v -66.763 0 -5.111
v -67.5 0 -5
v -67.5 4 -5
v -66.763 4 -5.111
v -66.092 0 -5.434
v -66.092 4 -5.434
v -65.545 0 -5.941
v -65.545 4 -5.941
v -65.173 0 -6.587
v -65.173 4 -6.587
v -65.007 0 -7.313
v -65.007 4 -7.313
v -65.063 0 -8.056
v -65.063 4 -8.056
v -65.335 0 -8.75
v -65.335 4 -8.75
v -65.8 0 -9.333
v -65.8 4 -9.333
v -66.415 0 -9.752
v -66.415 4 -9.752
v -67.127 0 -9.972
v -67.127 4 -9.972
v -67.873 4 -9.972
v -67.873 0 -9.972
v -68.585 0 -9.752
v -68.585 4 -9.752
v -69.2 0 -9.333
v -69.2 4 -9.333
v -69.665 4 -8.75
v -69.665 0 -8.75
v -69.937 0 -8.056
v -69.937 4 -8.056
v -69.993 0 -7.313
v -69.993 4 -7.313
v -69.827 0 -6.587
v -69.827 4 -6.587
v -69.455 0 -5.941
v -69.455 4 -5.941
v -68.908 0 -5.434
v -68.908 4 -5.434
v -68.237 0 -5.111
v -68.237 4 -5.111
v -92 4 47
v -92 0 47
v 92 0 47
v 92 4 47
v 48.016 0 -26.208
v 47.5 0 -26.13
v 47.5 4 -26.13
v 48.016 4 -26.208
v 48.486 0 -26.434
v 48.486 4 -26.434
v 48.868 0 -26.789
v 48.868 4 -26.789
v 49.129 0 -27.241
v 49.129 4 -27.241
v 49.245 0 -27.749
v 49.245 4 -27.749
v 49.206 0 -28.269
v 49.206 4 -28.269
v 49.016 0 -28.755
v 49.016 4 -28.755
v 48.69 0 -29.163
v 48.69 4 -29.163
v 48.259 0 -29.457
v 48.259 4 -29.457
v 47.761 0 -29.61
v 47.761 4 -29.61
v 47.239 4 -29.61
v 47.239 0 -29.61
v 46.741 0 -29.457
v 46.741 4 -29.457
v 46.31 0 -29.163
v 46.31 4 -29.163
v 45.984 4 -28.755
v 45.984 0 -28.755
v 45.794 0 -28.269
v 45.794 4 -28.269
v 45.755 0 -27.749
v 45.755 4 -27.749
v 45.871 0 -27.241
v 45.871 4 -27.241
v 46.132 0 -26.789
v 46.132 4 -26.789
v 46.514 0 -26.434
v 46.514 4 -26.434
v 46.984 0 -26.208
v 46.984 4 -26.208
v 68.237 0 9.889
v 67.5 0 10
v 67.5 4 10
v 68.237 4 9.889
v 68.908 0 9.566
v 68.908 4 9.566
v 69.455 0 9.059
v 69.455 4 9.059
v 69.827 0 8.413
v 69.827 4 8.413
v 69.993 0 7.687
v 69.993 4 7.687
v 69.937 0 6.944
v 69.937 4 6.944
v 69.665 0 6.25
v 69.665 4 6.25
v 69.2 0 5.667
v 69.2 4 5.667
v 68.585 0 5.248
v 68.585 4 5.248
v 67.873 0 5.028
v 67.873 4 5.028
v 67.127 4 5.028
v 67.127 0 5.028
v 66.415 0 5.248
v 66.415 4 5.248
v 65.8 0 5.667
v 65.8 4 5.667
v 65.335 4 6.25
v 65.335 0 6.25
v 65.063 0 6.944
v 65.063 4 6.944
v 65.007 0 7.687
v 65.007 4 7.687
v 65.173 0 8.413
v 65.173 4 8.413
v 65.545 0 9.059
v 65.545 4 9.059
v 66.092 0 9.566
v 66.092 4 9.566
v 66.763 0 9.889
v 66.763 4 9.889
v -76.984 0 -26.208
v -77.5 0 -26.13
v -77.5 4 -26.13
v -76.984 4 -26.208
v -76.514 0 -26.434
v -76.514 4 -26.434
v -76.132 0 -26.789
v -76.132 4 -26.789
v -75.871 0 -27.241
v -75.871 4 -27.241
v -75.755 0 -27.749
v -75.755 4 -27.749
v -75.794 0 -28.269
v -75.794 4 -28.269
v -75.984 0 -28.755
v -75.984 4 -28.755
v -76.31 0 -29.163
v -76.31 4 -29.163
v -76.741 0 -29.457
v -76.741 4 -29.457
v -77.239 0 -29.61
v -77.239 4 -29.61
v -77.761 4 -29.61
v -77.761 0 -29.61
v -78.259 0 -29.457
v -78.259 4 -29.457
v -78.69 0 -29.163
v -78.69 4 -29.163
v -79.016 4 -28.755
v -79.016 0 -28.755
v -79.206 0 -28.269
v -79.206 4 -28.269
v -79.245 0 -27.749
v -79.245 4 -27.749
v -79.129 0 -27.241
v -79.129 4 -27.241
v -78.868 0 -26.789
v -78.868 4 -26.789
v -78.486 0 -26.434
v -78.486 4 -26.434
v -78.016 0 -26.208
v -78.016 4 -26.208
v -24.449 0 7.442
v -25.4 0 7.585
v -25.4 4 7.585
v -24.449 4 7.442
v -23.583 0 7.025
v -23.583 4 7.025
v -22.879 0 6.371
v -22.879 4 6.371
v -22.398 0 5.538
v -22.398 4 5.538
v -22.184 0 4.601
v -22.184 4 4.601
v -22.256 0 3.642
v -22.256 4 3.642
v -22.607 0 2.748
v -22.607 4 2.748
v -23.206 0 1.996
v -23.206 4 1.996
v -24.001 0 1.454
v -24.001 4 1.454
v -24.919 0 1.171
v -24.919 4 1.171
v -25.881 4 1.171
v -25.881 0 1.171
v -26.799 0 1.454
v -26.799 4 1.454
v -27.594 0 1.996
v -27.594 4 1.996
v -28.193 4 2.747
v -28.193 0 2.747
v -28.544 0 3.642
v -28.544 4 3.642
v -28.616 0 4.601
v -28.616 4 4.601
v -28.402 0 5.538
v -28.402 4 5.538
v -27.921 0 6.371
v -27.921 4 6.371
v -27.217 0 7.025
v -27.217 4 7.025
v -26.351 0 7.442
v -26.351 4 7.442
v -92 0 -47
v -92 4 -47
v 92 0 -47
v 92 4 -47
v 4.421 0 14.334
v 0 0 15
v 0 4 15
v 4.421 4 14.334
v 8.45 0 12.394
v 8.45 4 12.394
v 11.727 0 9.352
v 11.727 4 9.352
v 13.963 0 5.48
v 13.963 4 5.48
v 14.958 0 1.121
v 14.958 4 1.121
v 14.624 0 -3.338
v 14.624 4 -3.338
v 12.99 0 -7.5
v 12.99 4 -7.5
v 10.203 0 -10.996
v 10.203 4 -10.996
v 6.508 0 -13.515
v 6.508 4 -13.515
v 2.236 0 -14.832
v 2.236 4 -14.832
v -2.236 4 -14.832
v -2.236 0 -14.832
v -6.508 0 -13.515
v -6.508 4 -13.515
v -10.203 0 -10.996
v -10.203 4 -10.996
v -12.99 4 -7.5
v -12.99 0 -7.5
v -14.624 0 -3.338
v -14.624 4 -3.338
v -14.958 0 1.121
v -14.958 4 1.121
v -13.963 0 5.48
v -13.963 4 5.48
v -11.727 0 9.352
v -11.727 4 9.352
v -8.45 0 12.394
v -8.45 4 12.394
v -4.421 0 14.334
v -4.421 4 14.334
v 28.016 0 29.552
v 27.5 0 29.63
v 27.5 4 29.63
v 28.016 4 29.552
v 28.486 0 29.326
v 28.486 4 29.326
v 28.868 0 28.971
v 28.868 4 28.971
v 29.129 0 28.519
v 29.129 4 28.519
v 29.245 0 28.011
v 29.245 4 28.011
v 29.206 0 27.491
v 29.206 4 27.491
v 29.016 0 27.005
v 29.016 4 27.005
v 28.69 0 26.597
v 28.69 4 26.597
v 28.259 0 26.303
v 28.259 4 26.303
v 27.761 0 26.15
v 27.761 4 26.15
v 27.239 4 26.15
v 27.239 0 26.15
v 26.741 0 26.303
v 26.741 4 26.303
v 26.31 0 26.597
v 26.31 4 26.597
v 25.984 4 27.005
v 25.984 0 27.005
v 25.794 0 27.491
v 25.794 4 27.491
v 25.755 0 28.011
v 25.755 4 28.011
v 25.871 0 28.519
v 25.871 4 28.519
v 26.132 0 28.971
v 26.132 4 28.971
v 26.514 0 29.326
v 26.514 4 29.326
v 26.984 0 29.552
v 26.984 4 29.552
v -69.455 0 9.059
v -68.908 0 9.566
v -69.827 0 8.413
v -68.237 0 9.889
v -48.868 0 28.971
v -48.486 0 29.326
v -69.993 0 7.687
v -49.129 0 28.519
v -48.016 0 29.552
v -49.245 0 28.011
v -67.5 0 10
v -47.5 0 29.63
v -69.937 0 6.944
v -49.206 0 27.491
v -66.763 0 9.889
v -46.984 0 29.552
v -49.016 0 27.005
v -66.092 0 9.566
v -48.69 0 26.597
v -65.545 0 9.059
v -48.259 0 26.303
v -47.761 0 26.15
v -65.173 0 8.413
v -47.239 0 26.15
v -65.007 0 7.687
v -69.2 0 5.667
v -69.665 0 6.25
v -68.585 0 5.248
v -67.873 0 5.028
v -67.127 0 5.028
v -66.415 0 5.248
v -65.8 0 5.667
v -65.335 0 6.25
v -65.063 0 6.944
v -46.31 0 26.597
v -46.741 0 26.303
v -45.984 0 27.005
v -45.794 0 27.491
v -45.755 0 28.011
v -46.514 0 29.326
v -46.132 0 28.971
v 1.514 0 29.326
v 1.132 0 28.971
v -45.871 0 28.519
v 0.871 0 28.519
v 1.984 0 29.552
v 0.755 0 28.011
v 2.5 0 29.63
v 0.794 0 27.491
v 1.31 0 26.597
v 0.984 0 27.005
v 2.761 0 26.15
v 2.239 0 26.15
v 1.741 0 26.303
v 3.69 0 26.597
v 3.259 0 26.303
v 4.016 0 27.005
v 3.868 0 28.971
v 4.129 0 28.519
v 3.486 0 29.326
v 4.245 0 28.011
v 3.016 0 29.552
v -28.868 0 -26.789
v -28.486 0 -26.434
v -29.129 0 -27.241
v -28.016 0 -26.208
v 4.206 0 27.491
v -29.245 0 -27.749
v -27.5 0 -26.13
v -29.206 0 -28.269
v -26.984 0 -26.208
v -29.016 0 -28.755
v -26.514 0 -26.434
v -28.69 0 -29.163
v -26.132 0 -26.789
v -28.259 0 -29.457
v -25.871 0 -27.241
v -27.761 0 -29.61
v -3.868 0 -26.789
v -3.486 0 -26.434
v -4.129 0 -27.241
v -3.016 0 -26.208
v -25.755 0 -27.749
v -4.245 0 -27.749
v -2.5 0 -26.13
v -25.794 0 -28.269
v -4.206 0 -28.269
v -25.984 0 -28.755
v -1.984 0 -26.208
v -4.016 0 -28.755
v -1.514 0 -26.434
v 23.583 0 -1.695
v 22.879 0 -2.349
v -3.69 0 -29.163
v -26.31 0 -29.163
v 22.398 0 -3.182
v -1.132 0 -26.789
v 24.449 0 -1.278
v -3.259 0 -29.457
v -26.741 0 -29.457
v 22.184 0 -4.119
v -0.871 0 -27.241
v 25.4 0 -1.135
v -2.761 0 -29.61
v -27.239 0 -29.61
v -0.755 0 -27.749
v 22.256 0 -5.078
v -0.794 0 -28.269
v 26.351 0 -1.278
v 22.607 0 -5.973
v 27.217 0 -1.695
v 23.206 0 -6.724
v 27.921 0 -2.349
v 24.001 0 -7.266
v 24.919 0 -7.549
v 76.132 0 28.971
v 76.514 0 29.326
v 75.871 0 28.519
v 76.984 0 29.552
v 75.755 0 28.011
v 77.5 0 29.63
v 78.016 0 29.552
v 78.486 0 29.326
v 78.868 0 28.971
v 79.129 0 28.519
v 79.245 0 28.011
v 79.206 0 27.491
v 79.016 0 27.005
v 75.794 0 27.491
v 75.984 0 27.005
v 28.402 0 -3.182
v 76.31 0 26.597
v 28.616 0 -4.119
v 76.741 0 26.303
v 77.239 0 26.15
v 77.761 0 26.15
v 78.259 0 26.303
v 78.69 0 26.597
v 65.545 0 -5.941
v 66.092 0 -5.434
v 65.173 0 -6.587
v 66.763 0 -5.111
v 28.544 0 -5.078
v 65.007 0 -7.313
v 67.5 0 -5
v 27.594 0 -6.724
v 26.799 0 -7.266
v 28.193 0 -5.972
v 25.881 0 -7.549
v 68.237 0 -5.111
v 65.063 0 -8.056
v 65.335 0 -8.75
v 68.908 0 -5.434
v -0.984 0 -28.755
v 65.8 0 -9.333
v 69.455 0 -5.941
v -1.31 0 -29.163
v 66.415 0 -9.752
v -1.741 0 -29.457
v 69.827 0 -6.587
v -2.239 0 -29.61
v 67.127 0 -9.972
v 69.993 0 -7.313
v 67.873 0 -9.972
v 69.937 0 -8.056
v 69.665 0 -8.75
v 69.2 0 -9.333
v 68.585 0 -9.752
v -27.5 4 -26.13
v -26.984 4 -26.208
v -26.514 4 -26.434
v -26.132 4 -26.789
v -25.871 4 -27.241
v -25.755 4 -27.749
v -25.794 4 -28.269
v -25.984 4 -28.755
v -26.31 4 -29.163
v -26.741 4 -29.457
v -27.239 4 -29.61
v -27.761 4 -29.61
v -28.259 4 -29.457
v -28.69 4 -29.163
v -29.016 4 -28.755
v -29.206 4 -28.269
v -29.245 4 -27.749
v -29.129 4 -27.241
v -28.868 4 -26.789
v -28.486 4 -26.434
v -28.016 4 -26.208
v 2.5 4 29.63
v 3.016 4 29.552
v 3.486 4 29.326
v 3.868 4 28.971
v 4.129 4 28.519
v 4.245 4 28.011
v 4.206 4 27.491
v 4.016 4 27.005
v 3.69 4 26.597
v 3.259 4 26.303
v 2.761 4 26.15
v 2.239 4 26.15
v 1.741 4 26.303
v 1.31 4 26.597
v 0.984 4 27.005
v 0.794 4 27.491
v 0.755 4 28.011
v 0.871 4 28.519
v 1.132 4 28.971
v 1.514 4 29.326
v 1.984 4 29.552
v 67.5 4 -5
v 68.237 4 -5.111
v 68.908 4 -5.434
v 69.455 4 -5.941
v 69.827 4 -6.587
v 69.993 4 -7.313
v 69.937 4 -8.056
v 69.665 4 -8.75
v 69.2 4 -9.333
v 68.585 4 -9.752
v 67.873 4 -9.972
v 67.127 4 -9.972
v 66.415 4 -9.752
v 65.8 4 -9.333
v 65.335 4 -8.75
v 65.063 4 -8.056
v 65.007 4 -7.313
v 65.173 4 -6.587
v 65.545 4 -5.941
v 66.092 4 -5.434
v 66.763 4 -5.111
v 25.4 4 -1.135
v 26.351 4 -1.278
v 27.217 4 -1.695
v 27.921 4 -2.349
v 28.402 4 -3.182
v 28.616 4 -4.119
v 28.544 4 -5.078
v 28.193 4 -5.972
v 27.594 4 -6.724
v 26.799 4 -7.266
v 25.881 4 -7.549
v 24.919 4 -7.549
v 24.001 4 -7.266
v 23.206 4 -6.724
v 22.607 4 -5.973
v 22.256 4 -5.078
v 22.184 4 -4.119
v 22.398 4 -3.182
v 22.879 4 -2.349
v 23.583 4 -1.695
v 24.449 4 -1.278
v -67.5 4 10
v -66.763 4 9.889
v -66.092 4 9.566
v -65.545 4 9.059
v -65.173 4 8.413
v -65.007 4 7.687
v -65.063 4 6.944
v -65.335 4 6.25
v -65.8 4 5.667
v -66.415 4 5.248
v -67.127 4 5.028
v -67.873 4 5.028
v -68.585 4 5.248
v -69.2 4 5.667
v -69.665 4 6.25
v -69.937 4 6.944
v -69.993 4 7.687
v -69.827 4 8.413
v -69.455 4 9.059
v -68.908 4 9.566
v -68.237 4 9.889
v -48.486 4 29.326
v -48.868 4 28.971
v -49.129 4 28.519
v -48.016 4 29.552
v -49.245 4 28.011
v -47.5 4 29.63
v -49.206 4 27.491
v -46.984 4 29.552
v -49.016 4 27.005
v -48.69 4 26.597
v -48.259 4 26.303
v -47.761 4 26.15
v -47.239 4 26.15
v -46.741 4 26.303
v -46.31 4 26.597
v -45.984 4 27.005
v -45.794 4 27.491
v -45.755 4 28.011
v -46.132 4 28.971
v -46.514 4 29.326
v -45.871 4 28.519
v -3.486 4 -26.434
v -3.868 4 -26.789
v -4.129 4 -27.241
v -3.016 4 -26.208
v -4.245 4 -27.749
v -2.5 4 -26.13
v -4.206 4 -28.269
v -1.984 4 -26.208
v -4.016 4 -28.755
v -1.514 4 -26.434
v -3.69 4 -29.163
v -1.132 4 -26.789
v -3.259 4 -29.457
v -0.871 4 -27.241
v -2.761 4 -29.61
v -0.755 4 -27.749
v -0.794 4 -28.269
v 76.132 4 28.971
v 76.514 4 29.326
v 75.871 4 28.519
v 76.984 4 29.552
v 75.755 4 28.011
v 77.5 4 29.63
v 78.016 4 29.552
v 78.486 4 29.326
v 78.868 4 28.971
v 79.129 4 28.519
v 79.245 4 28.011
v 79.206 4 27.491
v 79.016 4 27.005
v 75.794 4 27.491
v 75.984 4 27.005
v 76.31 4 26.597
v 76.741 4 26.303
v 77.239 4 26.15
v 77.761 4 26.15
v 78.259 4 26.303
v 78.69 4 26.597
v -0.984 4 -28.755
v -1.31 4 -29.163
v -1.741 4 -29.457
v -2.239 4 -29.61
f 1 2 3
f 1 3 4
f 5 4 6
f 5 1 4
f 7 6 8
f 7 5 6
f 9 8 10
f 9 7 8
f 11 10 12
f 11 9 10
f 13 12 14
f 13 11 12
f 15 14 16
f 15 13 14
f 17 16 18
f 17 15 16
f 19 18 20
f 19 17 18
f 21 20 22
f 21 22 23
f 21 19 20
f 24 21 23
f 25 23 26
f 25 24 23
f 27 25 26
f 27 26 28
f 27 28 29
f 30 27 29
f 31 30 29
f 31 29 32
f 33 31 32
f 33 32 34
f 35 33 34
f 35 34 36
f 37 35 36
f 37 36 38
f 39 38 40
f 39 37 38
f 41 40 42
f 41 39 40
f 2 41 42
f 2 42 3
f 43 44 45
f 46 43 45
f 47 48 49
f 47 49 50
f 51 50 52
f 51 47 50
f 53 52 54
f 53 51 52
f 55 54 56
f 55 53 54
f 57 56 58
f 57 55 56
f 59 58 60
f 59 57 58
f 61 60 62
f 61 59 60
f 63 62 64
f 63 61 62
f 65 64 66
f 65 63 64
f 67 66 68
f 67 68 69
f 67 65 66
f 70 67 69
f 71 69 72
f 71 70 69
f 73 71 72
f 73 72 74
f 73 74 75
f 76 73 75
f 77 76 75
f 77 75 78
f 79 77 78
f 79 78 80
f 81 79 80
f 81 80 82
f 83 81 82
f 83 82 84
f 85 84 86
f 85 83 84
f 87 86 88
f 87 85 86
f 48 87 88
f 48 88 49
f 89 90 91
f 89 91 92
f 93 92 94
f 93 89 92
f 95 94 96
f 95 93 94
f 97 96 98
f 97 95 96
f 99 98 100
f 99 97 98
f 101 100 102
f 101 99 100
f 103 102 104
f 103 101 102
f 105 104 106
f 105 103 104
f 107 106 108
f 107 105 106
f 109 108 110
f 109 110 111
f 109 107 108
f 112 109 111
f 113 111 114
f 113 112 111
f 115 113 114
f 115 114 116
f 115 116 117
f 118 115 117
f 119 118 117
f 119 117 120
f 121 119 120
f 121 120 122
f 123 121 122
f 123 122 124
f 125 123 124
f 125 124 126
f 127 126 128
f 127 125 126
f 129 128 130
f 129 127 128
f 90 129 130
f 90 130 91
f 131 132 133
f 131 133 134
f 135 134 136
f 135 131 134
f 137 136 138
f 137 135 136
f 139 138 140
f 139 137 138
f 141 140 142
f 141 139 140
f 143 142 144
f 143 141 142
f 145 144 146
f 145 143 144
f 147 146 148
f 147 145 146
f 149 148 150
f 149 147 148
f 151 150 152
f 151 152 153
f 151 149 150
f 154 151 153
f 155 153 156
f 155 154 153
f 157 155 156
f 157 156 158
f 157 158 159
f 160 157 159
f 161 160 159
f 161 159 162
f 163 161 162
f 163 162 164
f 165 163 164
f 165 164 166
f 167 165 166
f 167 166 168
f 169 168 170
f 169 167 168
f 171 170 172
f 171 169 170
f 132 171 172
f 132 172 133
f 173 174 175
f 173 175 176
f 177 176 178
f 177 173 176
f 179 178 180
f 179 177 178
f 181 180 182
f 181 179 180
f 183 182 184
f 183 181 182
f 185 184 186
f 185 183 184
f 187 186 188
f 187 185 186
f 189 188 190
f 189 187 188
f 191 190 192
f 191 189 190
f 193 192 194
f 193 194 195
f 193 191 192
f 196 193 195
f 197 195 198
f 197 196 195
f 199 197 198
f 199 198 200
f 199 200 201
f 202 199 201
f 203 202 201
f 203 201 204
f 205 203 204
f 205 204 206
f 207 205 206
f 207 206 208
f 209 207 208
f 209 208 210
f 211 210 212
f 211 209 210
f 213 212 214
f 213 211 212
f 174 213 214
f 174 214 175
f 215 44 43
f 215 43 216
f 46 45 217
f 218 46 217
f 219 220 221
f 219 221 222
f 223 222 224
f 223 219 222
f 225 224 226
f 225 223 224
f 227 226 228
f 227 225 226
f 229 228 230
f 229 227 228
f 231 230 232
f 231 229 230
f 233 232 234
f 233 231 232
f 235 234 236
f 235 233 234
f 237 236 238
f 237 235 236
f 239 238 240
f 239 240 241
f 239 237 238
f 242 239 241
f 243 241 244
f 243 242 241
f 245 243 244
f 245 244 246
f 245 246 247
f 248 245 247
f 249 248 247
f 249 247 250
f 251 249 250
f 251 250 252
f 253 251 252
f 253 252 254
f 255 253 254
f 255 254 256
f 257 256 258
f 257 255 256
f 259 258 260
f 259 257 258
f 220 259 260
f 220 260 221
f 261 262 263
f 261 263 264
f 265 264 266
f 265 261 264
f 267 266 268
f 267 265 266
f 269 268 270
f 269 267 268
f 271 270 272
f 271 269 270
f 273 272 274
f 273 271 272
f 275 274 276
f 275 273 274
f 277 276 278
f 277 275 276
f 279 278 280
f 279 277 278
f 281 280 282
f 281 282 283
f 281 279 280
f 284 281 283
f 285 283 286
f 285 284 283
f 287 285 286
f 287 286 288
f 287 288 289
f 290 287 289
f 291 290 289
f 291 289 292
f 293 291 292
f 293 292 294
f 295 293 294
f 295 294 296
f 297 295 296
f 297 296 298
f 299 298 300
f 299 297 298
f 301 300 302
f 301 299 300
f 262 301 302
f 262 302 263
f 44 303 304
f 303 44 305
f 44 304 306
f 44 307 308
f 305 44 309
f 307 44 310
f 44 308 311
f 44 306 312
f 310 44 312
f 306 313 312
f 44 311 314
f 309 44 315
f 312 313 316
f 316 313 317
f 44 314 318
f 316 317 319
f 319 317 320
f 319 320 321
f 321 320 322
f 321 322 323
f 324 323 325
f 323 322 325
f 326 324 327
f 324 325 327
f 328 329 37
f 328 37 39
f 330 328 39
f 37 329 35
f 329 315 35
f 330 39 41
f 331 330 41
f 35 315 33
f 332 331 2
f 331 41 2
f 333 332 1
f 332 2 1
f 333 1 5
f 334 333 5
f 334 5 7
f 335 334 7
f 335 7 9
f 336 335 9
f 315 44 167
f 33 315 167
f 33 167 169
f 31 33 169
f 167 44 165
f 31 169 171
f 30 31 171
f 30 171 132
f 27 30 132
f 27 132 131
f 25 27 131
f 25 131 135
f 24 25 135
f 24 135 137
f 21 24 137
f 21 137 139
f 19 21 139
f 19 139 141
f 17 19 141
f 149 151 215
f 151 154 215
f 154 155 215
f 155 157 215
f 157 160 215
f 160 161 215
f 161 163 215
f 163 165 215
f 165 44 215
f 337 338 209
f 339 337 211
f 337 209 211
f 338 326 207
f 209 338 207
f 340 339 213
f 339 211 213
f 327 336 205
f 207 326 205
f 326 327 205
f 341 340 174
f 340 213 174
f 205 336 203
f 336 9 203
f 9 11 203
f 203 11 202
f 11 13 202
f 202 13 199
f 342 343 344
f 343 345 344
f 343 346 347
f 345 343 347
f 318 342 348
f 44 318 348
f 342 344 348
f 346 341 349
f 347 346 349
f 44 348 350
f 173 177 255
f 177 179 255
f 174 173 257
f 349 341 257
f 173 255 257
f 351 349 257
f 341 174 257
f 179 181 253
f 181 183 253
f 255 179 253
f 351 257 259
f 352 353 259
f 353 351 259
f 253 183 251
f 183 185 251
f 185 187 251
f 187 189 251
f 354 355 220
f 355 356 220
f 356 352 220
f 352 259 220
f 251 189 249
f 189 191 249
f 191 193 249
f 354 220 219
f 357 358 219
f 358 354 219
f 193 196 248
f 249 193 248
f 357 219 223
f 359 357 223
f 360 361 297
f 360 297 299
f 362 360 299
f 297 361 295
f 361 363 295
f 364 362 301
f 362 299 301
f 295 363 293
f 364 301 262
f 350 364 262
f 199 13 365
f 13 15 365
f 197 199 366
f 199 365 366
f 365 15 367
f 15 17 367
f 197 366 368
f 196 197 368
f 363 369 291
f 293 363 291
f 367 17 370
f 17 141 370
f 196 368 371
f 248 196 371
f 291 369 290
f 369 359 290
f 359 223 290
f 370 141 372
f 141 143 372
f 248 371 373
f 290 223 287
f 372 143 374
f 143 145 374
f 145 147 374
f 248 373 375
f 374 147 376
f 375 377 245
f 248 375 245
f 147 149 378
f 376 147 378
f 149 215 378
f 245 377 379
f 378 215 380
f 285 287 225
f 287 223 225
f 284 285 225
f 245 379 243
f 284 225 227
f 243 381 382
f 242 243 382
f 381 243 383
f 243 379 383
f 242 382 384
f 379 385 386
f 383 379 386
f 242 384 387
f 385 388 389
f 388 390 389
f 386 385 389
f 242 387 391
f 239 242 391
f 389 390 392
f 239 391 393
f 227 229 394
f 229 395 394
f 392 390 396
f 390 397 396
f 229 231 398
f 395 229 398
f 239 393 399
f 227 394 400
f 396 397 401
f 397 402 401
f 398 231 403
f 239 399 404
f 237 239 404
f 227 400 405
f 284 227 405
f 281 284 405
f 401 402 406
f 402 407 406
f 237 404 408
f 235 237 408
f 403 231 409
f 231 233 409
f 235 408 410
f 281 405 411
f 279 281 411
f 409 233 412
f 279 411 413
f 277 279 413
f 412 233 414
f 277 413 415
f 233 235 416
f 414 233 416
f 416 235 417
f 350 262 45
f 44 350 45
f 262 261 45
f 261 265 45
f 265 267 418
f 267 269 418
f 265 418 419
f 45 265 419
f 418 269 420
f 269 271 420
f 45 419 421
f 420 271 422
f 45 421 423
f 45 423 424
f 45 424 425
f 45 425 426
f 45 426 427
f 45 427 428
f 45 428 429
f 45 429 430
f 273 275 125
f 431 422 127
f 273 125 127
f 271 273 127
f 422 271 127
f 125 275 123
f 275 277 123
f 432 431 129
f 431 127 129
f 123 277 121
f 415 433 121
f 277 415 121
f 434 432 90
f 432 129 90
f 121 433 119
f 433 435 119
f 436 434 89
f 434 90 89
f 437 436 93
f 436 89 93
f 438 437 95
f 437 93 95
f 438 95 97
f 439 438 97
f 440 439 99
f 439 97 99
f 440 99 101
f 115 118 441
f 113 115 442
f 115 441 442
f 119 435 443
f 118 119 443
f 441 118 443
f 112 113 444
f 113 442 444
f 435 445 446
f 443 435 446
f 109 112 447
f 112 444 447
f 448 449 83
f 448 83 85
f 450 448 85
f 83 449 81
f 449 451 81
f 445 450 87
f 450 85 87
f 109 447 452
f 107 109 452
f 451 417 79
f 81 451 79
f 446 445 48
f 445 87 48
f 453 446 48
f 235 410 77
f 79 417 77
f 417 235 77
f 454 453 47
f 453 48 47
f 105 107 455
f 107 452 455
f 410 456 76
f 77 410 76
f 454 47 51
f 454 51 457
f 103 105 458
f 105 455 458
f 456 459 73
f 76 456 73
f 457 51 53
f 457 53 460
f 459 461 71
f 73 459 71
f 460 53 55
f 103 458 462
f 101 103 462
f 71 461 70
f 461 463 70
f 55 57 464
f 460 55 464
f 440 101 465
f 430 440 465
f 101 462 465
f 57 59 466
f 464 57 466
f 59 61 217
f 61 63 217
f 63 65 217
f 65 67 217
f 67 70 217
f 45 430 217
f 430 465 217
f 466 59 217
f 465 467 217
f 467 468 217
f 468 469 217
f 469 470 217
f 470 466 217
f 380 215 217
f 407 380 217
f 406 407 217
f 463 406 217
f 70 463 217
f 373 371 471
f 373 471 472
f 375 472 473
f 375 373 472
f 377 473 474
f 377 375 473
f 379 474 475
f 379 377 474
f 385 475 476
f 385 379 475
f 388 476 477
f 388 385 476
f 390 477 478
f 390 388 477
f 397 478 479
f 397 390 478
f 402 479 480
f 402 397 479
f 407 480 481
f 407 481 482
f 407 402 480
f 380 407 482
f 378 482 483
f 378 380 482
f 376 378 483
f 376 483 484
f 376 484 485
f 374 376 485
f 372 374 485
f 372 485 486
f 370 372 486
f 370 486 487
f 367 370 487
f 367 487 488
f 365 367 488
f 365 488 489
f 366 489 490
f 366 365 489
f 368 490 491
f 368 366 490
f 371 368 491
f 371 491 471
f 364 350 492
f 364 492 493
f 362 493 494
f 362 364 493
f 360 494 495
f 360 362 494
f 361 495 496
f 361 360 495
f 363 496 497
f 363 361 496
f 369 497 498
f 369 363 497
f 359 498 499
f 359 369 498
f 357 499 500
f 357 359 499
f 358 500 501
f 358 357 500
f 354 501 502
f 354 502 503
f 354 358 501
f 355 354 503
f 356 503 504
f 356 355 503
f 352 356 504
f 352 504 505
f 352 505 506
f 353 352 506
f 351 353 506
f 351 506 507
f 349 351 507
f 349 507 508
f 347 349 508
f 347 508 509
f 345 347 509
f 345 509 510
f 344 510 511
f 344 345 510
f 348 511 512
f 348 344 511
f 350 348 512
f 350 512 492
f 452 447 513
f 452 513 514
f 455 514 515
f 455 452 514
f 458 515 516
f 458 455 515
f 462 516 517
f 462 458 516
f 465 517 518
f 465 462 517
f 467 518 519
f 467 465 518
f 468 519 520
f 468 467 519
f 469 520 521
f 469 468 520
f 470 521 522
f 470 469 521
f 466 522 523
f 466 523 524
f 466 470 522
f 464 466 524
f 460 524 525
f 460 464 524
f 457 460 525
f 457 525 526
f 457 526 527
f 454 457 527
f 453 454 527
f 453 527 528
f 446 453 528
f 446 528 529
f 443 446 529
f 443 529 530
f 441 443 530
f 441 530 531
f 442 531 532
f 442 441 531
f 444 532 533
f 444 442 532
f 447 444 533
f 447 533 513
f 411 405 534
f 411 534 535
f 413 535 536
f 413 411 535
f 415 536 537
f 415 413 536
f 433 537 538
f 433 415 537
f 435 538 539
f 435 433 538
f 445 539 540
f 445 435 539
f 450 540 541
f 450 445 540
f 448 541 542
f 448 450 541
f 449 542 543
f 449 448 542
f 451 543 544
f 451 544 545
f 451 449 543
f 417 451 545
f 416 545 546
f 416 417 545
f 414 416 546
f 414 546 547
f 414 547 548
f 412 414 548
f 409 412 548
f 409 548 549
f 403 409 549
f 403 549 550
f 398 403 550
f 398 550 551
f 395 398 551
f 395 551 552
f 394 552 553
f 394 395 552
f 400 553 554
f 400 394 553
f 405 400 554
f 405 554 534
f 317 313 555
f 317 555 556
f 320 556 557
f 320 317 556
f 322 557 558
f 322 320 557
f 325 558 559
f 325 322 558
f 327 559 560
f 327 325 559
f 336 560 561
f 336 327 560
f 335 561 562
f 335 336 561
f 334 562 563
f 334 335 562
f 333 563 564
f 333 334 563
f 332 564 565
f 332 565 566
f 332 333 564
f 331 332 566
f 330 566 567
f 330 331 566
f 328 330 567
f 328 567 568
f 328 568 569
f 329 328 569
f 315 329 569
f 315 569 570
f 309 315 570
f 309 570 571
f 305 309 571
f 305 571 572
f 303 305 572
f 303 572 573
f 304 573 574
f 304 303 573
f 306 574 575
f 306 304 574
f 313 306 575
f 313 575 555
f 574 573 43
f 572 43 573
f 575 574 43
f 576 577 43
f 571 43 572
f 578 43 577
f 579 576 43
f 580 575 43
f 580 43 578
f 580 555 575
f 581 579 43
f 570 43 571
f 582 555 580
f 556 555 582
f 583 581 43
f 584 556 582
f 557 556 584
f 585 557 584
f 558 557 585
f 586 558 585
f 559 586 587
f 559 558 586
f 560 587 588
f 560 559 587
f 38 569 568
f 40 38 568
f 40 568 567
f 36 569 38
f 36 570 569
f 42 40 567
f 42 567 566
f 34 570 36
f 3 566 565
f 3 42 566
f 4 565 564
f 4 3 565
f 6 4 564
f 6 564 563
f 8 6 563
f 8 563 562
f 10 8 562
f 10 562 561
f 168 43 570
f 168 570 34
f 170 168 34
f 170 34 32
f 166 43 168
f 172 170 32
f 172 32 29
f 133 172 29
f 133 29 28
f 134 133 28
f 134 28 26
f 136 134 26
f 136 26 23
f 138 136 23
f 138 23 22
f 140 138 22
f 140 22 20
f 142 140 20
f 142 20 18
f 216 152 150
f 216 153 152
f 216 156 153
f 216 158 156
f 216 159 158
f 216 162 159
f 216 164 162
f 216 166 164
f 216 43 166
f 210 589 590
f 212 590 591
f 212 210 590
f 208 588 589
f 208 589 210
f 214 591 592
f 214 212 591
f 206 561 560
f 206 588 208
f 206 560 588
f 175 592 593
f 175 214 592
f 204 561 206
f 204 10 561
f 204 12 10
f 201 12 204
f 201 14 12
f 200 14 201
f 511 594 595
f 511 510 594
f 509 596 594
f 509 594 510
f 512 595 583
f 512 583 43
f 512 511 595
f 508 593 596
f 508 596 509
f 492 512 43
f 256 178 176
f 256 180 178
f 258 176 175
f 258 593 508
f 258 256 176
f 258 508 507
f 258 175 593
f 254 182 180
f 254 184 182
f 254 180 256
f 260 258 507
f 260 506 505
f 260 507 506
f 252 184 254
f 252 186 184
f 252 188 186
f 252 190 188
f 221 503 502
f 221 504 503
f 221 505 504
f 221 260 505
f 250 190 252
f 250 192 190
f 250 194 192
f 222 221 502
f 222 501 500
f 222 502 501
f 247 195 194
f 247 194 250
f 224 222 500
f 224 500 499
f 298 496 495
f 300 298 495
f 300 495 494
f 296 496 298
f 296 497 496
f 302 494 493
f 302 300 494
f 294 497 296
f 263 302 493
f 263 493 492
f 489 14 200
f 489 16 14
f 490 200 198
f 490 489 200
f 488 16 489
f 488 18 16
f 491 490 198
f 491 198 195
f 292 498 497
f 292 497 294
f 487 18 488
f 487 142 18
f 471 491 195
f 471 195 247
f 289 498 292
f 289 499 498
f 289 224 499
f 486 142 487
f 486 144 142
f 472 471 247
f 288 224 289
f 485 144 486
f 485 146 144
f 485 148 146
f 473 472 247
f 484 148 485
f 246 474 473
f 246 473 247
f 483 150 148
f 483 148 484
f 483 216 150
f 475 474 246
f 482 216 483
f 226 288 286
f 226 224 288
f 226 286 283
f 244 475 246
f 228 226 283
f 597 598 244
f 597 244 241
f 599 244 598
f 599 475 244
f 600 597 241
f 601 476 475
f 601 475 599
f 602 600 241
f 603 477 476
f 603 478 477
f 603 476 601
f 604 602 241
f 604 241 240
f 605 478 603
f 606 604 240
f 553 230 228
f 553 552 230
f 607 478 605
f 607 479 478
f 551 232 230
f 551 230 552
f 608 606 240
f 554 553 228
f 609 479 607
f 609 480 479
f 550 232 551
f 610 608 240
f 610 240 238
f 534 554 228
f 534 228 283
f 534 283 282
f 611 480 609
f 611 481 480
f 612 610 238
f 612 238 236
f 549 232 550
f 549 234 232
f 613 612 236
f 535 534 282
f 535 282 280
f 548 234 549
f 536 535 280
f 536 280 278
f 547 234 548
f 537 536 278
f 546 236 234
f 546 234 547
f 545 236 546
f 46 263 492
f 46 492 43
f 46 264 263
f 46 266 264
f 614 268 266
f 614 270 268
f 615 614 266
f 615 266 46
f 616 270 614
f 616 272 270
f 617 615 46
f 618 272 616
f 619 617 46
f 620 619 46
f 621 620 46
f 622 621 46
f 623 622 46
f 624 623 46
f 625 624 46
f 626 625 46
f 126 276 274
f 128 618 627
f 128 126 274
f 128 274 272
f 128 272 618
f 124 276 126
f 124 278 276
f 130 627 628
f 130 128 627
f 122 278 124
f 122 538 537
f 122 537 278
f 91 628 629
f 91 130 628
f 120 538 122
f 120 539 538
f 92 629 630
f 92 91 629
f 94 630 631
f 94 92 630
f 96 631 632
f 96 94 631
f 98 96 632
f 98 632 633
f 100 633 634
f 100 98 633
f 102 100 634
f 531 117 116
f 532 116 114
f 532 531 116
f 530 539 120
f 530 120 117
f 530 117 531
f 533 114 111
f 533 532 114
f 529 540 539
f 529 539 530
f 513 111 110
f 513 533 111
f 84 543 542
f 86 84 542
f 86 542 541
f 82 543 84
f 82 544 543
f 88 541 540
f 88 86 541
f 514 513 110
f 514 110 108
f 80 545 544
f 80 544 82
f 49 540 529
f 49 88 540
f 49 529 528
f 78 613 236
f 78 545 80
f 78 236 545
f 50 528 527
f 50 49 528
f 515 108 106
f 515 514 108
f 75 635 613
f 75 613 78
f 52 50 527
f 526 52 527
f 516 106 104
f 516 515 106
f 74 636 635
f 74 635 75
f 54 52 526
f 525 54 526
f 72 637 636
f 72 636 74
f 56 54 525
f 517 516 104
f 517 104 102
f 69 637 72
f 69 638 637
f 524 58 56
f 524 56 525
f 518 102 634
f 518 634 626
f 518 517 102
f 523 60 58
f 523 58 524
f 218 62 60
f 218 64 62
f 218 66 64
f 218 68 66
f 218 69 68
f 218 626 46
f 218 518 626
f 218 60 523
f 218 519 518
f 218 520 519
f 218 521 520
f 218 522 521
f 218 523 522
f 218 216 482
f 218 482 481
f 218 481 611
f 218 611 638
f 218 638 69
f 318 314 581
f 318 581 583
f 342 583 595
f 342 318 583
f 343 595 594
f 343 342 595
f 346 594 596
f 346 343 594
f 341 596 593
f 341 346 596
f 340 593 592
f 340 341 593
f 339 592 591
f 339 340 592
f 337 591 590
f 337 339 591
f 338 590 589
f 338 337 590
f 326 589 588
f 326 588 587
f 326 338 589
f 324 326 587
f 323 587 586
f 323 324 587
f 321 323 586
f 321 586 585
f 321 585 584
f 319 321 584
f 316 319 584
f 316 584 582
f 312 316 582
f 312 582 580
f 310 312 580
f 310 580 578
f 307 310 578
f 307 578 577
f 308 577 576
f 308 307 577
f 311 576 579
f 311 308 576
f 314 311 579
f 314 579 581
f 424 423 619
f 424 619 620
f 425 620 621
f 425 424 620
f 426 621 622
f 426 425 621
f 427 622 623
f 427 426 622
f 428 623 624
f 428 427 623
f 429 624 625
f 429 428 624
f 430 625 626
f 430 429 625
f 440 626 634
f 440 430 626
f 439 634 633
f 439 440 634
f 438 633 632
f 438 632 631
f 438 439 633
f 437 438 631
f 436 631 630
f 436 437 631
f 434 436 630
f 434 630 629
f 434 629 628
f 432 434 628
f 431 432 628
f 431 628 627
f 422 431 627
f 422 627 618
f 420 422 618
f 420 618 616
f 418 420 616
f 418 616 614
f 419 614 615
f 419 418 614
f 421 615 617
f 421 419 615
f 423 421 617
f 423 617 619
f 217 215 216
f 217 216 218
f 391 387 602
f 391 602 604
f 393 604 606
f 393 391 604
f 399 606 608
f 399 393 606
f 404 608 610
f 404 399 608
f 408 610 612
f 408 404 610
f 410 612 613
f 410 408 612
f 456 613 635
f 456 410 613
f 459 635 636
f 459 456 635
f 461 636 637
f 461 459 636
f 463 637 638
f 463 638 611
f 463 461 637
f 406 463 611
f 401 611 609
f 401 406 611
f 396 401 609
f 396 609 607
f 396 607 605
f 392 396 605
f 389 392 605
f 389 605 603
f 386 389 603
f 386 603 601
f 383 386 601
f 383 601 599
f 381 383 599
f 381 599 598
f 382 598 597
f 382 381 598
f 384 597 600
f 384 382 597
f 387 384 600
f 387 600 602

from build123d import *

# Parameters (mm, degrees)
SKETCH1_W           = 184
SKETCH1_H           = 94
SKETCH1_R           = 15
SKETCH1_R_2         = 1.75
SKETCH1_R_3         = 3.225
SKETCH1_R_4         = 2.5
BOSS_EXTRUDE1_DEPTH = 4


with BuildPart() as part:
    # Sketch1 → Boss-Extrude1 (new body)
    with BuildSketch(Plane(origin=(0, 0, 0), x_dir=(1, 0, 0), z_dir=(0, 1, 0))):
        Rectangle(SKETCH1_W, SKETCH1_H)
        with Locations(Location((0, 0, 0), (0, 0, 270))):
            Circle(SKETCH1_R, mode=Mode.SUBTRACT)
        with Locations(Location((-2.5, 27.88, 0), (0, 0, 270))):
            Circle(SKETCH1_R_2, mode=Mode.SUBTRACT)
        with Locations(Location((-27.5, 27.88, 0), (0, 0, 270))):
            Circle(SKETCH1_R_2, mode=Mode.SUBTRACT)
        with Locations(Location((47.5, 27.88, 0), (0, 0, 270))):
            Circle(SKETCH1_R_2, mode=Mode.SUBTRACT)
        with Locations(Location((-77.5, 27.88, 0), (0, 0, 270))):
            Circle(SKETCH1_R_2, mode=Mode.SUBTRACT)
        with Locations(Location((25.4, 4.36, 0), (0, 0, 270))):
            Circle(SKETCH1_R_3, mode=Mode.SUBTRACT)
        with Locations(Location((-67.5, 7.5, 0), (0, 0, 270))):
            Circle(SKETCH1_R_4, mode=Mode.SUBTRACT)
        with Locations(Location((67.5, 7.5, 0), (0, 0, 270))):
            Circle(SKETCH1_R_4, mode=Mode.SUBTRACT)
        with Locations(Location((77.5, -27.88, 0), (0, 0, 270))):
            Circle(SKETCH1_R_2, mode=Mode.SUBTRACT)
        with Locations(Location((27.5, -27.88, 0), (0, 0, 270))):
            Circle(SKETCH1_R_2, mode=Mode.SUBTRACT)
        with Locations(Location((2.5, -27.88, 0), (0, 0, 270))):
            Circle(SKETCH1_R_2, mode=Mode.SUBTRACT)
        with Locations(Location((-47.5, -27.88, 0), (0, 0, 270))):
            Circle(SKETCH1_R_2, mode=Mode.SUBTRACT)
        with Locations(Location((-25.4, -4.36, 0), (0, 0, 270))):
            Circle(SKETCH1_R_3, mode=Mode.SUBTRACT)
        with Locations(Location((-67.5, -7.5, 0), (0, 0, 270))):
            Circle(SKETCH1_R_4, mode=Mode.SUBTRACT)
        with Locations(Location((67.5, -7.5, 0), (0, 0, 270))):
            Circle(SKETCH1_R_4, mode=Mode.SUBTRACT)
    extrude(amount=BOSS_EXTRUDE1_DEPTH)


solid = part.part
